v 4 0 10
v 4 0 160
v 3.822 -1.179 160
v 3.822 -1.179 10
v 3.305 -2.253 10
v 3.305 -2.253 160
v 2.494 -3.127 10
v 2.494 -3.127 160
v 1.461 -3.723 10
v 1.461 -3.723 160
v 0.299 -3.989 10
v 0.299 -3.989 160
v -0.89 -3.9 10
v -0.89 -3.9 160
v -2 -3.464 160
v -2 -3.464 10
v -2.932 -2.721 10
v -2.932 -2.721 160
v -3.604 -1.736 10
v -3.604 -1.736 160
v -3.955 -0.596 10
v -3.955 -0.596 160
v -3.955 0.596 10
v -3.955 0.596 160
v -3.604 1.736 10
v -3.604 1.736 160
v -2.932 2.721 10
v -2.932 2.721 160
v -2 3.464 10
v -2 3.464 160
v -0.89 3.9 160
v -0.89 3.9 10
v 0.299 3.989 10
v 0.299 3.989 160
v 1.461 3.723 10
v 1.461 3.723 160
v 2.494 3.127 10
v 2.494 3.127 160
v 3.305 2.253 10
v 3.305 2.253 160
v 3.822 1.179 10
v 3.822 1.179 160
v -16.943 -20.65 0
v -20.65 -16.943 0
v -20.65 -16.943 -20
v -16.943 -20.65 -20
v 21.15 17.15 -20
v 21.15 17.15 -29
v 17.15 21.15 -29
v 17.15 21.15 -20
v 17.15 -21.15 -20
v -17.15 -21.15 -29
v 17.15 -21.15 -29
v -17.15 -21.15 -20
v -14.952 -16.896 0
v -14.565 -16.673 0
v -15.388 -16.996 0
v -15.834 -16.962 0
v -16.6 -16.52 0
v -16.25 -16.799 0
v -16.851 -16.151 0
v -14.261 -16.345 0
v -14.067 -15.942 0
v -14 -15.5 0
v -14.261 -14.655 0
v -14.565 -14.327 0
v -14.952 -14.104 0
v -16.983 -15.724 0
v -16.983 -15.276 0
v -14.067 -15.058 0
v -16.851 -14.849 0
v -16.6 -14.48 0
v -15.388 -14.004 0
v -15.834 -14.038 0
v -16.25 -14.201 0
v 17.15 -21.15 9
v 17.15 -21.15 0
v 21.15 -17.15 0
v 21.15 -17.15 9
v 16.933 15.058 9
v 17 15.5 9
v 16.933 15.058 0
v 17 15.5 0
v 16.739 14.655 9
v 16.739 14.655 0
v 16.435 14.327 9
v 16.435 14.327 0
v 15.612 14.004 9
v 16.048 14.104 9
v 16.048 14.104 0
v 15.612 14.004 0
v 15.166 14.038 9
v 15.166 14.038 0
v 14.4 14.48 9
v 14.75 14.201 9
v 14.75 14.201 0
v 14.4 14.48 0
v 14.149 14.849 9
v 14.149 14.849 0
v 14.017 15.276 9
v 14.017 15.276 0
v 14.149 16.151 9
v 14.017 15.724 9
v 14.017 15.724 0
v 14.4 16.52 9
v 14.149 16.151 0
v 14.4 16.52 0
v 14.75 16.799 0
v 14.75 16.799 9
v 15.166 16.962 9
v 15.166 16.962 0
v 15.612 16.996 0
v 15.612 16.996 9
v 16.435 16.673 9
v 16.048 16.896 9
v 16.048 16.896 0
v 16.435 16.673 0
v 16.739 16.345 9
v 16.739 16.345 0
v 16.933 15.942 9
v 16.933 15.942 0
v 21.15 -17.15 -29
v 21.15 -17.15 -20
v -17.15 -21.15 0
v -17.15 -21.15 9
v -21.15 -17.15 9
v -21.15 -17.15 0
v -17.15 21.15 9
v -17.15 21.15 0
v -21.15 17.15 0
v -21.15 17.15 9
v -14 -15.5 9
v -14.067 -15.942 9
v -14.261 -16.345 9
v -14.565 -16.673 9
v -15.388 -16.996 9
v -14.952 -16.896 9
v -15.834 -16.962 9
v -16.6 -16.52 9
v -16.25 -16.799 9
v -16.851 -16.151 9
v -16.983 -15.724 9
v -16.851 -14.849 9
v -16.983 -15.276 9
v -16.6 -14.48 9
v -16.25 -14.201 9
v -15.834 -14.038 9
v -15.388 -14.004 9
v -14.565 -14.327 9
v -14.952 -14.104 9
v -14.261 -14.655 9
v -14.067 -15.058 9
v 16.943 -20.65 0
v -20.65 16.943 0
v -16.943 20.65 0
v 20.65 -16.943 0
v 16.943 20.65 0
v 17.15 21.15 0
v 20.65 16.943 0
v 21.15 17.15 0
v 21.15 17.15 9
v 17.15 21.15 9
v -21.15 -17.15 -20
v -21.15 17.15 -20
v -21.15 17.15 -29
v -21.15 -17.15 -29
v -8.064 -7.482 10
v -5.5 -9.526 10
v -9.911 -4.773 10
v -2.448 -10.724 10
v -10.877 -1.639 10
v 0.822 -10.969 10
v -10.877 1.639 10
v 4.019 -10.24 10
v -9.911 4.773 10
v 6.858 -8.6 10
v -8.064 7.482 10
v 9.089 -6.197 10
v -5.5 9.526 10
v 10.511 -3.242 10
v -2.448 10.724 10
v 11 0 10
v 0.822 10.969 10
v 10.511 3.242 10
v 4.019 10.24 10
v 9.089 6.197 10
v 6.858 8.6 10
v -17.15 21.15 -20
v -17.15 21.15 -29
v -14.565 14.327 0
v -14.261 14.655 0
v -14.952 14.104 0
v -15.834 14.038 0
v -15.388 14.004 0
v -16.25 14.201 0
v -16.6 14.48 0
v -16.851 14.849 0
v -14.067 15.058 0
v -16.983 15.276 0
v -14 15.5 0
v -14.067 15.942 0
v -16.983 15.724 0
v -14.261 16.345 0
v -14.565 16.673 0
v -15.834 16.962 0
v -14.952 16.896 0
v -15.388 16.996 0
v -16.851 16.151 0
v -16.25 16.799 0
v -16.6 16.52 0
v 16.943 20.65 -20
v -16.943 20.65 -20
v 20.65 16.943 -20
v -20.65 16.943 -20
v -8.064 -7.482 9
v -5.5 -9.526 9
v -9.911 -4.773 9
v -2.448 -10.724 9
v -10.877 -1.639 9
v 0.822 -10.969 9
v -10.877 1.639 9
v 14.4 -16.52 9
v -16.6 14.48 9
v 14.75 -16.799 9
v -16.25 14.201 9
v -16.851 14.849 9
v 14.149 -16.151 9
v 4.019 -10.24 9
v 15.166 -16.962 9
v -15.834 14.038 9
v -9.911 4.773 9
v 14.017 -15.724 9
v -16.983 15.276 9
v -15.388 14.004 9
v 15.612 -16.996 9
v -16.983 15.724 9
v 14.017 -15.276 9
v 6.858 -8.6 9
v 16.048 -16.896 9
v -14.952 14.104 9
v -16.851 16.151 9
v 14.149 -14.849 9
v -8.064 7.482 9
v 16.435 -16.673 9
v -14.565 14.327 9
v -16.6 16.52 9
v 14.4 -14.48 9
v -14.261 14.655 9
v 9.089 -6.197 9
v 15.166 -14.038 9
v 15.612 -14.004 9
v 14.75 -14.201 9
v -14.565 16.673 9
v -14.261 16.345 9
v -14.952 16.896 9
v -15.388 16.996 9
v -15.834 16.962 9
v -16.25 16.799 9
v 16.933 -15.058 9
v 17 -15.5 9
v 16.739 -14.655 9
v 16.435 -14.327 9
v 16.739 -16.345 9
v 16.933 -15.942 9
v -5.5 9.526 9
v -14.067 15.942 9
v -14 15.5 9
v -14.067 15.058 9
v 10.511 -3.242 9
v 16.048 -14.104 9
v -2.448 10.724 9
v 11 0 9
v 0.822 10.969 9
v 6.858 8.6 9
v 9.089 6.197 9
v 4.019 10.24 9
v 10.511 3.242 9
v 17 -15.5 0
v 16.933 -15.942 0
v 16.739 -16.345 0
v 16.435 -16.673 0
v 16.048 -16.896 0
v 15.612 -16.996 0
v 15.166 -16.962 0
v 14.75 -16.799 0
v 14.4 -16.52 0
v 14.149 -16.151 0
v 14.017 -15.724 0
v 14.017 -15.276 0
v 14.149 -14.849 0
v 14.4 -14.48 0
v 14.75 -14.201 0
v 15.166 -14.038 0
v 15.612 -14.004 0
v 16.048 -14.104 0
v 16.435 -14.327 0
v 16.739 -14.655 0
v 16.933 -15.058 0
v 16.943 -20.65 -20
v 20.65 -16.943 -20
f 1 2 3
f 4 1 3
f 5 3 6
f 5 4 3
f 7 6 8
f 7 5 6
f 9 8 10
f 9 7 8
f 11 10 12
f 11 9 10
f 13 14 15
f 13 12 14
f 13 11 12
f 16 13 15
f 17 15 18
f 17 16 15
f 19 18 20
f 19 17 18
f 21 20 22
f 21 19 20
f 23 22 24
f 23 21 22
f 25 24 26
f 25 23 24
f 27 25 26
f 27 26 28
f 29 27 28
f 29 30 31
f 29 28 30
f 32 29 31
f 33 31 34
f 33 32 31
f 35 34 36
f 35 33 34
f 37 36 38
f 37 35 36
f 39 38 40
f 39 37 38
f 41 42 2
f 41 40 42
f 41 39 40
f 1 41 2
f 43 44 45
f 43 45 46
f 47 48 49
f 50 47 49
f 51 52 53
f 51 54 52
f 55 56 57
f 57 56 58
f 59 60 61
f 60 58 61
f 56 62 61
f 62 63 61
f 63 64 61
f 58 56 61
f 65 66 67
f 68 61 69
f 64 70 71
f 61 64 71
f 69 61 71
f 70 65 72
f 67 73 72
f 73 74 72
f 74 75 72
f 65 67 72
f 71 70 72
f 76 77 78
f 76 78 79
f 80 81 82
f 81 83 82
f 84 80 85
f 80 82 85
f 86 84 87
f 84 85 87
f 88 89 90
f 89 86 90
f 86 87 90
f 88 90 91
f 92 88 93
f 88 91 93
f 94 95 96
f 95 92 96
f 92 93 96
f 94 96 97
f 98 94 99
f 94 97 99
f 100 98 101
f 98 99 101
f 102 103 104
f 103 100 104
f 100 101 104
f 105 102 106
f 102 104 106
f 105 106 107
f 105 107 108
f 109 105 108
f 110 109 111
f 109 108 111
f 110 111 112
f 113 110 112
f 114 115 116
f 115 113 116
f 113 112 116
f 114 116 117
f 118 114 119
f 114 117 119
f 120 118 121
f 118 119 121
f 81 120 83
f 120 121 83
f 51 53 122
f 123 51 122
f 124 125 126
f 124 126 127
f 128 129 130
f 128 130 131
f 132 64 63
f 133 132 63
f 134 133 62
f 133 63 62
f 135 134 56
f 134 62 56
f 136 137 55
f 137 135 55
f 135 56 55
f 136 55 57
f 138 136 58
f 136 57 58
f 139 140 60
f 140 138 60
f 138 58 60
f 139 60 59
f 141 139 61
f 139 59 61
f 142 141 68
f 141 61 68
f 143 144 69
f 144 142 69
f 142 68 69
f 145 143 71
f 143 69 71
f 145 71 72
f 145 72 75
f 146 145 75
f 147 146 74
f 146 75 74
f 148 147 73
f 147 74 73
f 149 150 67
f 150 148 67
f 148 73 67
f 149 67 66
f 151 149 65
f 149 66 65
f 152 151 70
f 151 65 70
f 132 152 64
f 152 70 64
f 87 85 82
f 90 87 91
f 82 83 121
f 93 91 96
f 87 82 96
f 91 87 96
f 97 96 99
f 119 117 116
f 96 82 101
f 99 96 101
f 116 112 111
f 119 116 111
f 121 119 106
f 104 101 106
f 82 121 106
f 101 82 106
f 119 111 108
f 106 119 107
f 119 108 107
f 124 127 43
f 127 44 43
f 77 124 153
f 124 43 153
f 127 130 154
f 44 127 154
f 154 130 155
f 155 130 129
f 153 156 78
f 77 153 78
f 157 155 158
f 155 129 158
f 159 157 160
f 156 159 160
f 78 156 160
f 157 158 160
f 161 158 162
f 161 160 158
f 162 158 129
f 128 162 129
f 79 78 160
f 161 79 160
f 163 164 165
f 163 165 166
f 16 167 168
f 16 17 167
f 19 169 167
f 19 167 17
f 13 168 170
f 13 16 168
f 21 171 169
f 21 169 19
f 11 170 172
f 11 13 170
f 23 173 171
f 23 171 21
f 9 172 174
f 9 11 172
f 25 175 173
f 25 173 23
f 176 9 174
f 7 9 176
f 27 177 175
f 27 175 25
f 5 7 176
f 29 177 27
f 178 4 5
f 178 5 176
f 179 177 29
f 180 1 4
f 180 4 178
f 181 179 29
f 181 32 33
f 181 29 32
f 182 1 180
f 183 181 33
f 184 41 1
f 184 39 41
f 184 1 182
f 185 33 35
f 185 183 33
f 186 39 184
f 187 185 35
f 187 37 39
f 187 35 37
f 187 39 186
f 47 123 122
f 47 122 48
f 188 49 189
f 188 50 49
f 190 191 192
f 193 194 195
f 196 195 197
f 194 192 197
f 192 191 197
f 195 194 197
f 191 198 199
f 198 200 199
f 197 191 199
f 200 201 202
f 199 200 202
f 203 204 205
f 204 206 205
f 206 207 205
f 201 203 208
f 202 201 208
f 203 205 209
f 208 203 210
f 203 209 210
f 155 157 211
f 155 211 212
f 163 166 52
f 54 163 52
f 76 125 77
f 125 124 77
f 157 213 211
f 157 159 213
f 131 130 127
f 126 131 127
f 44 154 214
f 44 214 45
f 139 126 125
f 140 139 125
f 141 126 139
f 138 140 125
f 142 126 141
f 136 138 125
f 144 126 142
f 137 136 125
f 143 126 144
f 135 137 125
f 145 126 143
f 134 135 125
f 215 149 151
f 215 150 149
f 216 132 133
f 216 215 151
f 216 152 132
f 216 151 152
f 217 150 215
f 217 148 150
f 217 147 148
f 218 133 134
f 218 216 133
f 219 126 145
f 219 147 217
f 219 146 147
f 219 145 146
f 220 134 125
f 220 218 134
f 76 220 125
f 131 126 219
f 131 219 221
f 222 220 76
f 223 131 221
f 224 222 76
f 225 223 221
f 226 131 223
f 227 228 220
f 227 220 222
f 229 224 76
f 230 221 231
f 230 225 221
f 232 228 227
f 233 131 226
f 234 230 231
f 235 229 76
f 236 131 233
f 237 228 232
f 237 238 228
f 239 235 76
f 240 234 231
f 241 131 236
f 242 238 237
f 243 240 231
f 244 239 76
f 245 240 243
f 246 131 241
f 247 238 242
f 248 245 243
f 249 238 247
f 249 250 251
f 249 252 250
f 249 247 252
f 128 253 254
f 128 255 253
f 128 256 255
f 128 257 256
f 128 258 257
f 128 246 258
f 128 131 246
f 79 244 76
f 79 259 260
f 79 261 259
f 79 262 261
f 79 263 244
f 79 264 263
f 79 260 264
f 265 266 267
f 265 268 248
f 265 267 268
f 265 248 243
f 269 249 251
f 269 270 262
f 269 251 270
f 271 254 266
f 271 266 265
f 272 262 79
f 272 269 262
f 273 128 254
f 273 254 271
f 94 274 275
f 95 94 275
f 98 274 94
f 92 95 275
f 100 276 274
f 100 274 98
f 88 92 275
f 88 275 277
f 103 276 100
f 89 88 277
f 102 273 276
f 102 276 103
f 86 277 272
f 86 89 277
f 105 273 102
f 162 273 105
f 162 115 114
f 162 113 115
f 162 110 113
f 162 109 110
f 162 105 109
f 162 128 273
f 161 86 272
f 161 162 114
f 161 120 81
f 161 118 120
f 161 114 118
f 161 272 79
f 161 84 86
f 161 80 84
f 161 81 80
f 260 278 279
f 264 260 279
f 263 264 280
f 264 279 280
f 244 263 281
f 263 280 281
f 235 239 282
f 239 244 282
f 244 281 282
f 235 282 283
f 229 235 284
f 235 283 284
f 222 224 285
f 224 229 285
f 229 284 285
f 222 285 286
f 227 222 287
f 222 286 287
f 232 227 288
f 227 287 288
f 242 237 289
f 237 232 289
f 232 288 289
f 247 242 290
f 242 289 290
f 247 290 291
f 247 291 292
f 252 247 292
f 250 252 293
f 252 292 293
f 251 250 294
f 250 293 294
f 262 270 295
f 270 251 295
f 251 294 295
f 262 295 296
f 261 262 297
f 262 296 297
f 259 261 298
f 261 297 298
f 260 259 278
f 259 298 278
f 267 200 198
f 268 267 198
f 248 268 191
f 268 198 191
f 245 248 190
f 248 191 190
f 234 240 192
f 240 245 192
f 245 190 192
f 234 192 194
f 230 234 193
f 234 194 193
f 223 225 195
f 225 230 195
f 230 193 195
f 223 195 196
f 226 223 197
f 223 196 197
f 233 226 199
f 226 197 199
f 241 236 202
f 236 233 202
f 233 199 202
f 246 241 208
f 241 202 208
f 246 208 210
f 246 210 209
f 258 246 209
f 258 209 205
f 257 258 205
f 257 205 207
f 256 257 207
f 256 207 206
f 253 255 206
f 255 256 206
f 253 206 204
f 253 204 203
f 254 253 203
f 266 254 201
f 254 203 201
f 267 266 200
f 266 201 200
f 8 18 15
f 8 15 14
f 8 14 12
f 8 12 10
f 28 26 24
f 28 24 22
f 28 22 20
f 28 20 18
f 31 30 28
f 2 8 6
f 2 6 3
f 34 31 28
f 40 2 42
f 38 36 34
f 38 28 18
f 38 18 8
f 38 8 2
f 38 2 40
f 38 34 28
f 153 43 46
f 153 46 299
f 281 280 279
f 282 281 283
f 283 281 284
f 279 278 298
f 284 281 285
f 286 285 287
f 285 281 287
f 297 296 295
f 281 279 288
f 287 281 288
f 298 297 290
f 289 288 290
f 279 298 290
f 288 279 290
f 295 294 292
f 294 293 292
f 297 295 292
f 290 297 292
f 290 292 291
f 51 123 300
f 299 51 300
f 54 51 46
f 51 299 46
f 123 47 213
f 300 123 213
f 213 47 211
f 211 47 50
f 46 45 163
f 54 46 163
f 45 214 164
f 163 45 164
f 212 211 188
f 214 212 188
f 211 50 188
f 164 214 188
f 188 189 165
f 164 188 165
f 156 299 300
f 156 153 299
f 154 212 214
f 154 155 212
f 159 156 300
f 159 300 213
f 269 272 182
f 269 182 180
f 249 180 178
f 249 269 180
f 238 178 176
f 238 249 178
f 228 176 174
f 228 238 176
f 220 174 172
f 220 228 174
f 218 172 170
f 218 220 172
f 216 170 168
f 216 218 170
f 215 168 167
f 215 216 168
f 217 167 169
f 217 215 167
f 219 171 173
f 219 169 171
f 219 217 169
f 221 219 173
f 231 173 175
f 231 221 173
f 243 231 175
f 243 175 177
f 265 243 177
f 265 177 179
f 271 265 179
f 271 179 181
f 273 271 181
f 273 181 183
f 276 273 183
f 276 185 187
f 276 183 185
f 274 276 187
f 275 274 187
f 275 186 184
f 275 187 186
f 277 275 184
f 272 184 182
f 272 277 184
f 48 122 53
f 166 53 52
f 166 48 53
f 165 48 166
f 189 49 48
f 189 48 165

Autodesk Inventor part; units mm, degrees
ref_plane "YZ Plane" through (0, 0, 0) normal (1, 0, 0) x (0, 1, 0)
ref_plane "XZ Plane" through (0, 0, 0) normal (0, 1, 0) x (-1, 0, 0)
ref_plane "XY Plane" through (0, 0, 0) normal (0, 0, 1) x (1, 0, 0)
sketch "Sketch1" plane through (0, 0, 0) normal (0, 0, 1) x (1, 0, 0)
  line L0 (-21.15, -21.15) -> (21.15, -21.15)
  line L1 (21.15, -21.15) -> (21.15, 21.15)
  line L2 (21.15, 21.15) -> (-21.15, 21.15)
  line L3 (-21.15, 21.15) -> (-21.15, -21.15)
  line L4 (-21.15, -21.15) -> (21.15, 21.15) construction
  line L5 (21.15, -21.15) -> (-21.15, 21.15) construction
  line L6 (-15.5, -15.5) -> (15.5, -15.5) construction
  line L7 (15.5, -15.5) -> (15.5, 15.5) construction
  line L8 (15.5, 15.5) -> (-15.5, 15.5) construction
  line L9 (-15.5, 15.5) -> (-15.5, -15.5) construction
  line L10 (-15.5, -15.5) -> (15.5, 15.5) construction
  line L11 (15.5, -15.5) -> (-15.5, 15.5) construction
  circle A0 centre (-15.5, 15.5) radius 1.5
  circle A1 centre (15.5, 15.5) radius 1.5
  circle A2 centre (15.5, -15.5) radius 1.5
  circle A3 centre (-15.5, -15.5) radius 1.5
  point P0 (0, 0)
  dimension "d0" = 42.3
  dimension "d1" = 31
  dimension "d2" = 3
extrude "Extrusion1" add sketch "Sketch1" along normal blind 9
chamfer "Chamfer1" distance 4 angle 45 4 edges at (21.15, 21.15, 4.5) (21.15, -21.15, 4.5) (-21.15, 21.15, 4.5) (-21.15, -21.15, 4.5)
sketch "Sketch3" plane through (0, 0, 0) normal (0, 0, -1) x (-1, 0, 0)
  circle A0 centre (15.5, 15.5) radius 1.5 projected
  line L0 (21.15, 17.15) -> (21.15, -17.15) projected
  line L1 (17.15, 21.15) -> (21.15, 17.15) projected
  line L2 (-17.15, 21.15) -> (17.15, 21.15) projected
  line L3 (-21.15, 17.15) -> (-17.15, 21.15) projected
  line L4 (-21.15, -17.15) -> (-21.15, 17.15) projected
  circle A1 centre (15.5, -15.5) radius 1.5 projected
  circle A2 centre (-15.5, -15.5) radius 1.5 projected
  circle A3 centre (-15.5, 15.5) radius 1.5 projected
  circle A4 centre (15.5, 15.5) radius 1.5 projected
  line L5 (21.15, -17.15) -> (17.15, -21.15) projected
  line L6 (21.15, 17.15) -> (21.15, -17.15) projected
  line L7 (17.15, 21.15) -> (21.15, 17.15) projected
  line L8 (-17.15, 21.15) -> (17.15, 21.15) projected
  line L9 (-21.15, 17.15) -> (-17.15, 21.15) projected
  line L10 (-21.15, -17.15) -> (-21.15, 17.15) projected
  line L11 (-17.15, -21.15) -> (-21.15, -17.15) projected
  line L12 (17.15, -21.15) -> (-17.15, -21.15) projected
  line L13 (-20.65, 16.9429) -> (-16.9429, 20.65)
  line L14 (-16.9429, 20.65) -> (16.9429, 20.65)
  line L15 (16.9429, 20.65) -> (20.65, 16.9429)
  line L16 (20.65, 16.9429) -> (20.65, -16.9429)
  line L17 (20.65, -16.9429) -> (16.9429, -20.65)
  line L18 (16.9429, -20.65) -> (-16.9429, -20.65)
  line L19 (-16.9429, -20.65) -> (-20.65, -16.9429)
  line L20 (-20.65, -16.9429) -> (-20.65, 16.9429)
  point P0 (0, 0)
  dimension "d8" = 0.5
  dimension "d10" = 0.5
  dimension "d11" = 0.5
  dimension "d12" = 0.5
extrude "Extrusion2" add sketch "Sketch3" along normal blind 20 contours A0 | A1 | A2 | A3 | L13 L14 L15 L16 L17 L18 L19 L20
sketch "Sketch4" plane through (0, 0, -20) normal (0, 0, -1) x (-1, 0, 0)
  line L0 (-21.15, 17.15) -> (-17.15, 21.15) projected
  line L1 (-17.15, 21.15) -> (17.15, 21.15) projected
  line L2 (17.15, 21.15) -> (21.15, 17.15) projected
  line L3 (21.15, 17.15) -> (21.15, -17.15) projected
  line L4 (21.15, -17.15) -> (17.15, -21.15) projected
  line L5 (17.15, -21.15) -> (-17.15, -21.15) projected
  line L6 (-17.15, -21.15) -> (-21.15, -17.15) projected
  line L7 (-21.15, -17.15) -> (-21.15, 17.15) projected
  point P0 (0, 0)
extrude "Extrusion3" add sketch "Sketch4" along normal blind 9
sketch "Sketch5" plane through (0, 0, 9) normal (0, 0, 1) x (1, 0, 0)
  circle A0 centre (0, 0) radius 11
  dimension "d17" = 22
extrude "Extrusion4" add sketch "Sketch5" along normal blind 1
sketch "Sketch6" plane through (0, 0, 10) normal (0, 0, 1) x (1, 0, 0)
  circle A0 centre (0, 0) radius 11 projected
  circle A1 centre (0, 0) radius 4
  dimension "d20" = 8
extrude "Extrusion5" add sketch "Sketch6" along normal blind 150 contours A1
equation "\"d10\" = d8"
equation "\"d11\" = d8"
equation "\"d12\" = d8"
properties part number "StepperDrive"
